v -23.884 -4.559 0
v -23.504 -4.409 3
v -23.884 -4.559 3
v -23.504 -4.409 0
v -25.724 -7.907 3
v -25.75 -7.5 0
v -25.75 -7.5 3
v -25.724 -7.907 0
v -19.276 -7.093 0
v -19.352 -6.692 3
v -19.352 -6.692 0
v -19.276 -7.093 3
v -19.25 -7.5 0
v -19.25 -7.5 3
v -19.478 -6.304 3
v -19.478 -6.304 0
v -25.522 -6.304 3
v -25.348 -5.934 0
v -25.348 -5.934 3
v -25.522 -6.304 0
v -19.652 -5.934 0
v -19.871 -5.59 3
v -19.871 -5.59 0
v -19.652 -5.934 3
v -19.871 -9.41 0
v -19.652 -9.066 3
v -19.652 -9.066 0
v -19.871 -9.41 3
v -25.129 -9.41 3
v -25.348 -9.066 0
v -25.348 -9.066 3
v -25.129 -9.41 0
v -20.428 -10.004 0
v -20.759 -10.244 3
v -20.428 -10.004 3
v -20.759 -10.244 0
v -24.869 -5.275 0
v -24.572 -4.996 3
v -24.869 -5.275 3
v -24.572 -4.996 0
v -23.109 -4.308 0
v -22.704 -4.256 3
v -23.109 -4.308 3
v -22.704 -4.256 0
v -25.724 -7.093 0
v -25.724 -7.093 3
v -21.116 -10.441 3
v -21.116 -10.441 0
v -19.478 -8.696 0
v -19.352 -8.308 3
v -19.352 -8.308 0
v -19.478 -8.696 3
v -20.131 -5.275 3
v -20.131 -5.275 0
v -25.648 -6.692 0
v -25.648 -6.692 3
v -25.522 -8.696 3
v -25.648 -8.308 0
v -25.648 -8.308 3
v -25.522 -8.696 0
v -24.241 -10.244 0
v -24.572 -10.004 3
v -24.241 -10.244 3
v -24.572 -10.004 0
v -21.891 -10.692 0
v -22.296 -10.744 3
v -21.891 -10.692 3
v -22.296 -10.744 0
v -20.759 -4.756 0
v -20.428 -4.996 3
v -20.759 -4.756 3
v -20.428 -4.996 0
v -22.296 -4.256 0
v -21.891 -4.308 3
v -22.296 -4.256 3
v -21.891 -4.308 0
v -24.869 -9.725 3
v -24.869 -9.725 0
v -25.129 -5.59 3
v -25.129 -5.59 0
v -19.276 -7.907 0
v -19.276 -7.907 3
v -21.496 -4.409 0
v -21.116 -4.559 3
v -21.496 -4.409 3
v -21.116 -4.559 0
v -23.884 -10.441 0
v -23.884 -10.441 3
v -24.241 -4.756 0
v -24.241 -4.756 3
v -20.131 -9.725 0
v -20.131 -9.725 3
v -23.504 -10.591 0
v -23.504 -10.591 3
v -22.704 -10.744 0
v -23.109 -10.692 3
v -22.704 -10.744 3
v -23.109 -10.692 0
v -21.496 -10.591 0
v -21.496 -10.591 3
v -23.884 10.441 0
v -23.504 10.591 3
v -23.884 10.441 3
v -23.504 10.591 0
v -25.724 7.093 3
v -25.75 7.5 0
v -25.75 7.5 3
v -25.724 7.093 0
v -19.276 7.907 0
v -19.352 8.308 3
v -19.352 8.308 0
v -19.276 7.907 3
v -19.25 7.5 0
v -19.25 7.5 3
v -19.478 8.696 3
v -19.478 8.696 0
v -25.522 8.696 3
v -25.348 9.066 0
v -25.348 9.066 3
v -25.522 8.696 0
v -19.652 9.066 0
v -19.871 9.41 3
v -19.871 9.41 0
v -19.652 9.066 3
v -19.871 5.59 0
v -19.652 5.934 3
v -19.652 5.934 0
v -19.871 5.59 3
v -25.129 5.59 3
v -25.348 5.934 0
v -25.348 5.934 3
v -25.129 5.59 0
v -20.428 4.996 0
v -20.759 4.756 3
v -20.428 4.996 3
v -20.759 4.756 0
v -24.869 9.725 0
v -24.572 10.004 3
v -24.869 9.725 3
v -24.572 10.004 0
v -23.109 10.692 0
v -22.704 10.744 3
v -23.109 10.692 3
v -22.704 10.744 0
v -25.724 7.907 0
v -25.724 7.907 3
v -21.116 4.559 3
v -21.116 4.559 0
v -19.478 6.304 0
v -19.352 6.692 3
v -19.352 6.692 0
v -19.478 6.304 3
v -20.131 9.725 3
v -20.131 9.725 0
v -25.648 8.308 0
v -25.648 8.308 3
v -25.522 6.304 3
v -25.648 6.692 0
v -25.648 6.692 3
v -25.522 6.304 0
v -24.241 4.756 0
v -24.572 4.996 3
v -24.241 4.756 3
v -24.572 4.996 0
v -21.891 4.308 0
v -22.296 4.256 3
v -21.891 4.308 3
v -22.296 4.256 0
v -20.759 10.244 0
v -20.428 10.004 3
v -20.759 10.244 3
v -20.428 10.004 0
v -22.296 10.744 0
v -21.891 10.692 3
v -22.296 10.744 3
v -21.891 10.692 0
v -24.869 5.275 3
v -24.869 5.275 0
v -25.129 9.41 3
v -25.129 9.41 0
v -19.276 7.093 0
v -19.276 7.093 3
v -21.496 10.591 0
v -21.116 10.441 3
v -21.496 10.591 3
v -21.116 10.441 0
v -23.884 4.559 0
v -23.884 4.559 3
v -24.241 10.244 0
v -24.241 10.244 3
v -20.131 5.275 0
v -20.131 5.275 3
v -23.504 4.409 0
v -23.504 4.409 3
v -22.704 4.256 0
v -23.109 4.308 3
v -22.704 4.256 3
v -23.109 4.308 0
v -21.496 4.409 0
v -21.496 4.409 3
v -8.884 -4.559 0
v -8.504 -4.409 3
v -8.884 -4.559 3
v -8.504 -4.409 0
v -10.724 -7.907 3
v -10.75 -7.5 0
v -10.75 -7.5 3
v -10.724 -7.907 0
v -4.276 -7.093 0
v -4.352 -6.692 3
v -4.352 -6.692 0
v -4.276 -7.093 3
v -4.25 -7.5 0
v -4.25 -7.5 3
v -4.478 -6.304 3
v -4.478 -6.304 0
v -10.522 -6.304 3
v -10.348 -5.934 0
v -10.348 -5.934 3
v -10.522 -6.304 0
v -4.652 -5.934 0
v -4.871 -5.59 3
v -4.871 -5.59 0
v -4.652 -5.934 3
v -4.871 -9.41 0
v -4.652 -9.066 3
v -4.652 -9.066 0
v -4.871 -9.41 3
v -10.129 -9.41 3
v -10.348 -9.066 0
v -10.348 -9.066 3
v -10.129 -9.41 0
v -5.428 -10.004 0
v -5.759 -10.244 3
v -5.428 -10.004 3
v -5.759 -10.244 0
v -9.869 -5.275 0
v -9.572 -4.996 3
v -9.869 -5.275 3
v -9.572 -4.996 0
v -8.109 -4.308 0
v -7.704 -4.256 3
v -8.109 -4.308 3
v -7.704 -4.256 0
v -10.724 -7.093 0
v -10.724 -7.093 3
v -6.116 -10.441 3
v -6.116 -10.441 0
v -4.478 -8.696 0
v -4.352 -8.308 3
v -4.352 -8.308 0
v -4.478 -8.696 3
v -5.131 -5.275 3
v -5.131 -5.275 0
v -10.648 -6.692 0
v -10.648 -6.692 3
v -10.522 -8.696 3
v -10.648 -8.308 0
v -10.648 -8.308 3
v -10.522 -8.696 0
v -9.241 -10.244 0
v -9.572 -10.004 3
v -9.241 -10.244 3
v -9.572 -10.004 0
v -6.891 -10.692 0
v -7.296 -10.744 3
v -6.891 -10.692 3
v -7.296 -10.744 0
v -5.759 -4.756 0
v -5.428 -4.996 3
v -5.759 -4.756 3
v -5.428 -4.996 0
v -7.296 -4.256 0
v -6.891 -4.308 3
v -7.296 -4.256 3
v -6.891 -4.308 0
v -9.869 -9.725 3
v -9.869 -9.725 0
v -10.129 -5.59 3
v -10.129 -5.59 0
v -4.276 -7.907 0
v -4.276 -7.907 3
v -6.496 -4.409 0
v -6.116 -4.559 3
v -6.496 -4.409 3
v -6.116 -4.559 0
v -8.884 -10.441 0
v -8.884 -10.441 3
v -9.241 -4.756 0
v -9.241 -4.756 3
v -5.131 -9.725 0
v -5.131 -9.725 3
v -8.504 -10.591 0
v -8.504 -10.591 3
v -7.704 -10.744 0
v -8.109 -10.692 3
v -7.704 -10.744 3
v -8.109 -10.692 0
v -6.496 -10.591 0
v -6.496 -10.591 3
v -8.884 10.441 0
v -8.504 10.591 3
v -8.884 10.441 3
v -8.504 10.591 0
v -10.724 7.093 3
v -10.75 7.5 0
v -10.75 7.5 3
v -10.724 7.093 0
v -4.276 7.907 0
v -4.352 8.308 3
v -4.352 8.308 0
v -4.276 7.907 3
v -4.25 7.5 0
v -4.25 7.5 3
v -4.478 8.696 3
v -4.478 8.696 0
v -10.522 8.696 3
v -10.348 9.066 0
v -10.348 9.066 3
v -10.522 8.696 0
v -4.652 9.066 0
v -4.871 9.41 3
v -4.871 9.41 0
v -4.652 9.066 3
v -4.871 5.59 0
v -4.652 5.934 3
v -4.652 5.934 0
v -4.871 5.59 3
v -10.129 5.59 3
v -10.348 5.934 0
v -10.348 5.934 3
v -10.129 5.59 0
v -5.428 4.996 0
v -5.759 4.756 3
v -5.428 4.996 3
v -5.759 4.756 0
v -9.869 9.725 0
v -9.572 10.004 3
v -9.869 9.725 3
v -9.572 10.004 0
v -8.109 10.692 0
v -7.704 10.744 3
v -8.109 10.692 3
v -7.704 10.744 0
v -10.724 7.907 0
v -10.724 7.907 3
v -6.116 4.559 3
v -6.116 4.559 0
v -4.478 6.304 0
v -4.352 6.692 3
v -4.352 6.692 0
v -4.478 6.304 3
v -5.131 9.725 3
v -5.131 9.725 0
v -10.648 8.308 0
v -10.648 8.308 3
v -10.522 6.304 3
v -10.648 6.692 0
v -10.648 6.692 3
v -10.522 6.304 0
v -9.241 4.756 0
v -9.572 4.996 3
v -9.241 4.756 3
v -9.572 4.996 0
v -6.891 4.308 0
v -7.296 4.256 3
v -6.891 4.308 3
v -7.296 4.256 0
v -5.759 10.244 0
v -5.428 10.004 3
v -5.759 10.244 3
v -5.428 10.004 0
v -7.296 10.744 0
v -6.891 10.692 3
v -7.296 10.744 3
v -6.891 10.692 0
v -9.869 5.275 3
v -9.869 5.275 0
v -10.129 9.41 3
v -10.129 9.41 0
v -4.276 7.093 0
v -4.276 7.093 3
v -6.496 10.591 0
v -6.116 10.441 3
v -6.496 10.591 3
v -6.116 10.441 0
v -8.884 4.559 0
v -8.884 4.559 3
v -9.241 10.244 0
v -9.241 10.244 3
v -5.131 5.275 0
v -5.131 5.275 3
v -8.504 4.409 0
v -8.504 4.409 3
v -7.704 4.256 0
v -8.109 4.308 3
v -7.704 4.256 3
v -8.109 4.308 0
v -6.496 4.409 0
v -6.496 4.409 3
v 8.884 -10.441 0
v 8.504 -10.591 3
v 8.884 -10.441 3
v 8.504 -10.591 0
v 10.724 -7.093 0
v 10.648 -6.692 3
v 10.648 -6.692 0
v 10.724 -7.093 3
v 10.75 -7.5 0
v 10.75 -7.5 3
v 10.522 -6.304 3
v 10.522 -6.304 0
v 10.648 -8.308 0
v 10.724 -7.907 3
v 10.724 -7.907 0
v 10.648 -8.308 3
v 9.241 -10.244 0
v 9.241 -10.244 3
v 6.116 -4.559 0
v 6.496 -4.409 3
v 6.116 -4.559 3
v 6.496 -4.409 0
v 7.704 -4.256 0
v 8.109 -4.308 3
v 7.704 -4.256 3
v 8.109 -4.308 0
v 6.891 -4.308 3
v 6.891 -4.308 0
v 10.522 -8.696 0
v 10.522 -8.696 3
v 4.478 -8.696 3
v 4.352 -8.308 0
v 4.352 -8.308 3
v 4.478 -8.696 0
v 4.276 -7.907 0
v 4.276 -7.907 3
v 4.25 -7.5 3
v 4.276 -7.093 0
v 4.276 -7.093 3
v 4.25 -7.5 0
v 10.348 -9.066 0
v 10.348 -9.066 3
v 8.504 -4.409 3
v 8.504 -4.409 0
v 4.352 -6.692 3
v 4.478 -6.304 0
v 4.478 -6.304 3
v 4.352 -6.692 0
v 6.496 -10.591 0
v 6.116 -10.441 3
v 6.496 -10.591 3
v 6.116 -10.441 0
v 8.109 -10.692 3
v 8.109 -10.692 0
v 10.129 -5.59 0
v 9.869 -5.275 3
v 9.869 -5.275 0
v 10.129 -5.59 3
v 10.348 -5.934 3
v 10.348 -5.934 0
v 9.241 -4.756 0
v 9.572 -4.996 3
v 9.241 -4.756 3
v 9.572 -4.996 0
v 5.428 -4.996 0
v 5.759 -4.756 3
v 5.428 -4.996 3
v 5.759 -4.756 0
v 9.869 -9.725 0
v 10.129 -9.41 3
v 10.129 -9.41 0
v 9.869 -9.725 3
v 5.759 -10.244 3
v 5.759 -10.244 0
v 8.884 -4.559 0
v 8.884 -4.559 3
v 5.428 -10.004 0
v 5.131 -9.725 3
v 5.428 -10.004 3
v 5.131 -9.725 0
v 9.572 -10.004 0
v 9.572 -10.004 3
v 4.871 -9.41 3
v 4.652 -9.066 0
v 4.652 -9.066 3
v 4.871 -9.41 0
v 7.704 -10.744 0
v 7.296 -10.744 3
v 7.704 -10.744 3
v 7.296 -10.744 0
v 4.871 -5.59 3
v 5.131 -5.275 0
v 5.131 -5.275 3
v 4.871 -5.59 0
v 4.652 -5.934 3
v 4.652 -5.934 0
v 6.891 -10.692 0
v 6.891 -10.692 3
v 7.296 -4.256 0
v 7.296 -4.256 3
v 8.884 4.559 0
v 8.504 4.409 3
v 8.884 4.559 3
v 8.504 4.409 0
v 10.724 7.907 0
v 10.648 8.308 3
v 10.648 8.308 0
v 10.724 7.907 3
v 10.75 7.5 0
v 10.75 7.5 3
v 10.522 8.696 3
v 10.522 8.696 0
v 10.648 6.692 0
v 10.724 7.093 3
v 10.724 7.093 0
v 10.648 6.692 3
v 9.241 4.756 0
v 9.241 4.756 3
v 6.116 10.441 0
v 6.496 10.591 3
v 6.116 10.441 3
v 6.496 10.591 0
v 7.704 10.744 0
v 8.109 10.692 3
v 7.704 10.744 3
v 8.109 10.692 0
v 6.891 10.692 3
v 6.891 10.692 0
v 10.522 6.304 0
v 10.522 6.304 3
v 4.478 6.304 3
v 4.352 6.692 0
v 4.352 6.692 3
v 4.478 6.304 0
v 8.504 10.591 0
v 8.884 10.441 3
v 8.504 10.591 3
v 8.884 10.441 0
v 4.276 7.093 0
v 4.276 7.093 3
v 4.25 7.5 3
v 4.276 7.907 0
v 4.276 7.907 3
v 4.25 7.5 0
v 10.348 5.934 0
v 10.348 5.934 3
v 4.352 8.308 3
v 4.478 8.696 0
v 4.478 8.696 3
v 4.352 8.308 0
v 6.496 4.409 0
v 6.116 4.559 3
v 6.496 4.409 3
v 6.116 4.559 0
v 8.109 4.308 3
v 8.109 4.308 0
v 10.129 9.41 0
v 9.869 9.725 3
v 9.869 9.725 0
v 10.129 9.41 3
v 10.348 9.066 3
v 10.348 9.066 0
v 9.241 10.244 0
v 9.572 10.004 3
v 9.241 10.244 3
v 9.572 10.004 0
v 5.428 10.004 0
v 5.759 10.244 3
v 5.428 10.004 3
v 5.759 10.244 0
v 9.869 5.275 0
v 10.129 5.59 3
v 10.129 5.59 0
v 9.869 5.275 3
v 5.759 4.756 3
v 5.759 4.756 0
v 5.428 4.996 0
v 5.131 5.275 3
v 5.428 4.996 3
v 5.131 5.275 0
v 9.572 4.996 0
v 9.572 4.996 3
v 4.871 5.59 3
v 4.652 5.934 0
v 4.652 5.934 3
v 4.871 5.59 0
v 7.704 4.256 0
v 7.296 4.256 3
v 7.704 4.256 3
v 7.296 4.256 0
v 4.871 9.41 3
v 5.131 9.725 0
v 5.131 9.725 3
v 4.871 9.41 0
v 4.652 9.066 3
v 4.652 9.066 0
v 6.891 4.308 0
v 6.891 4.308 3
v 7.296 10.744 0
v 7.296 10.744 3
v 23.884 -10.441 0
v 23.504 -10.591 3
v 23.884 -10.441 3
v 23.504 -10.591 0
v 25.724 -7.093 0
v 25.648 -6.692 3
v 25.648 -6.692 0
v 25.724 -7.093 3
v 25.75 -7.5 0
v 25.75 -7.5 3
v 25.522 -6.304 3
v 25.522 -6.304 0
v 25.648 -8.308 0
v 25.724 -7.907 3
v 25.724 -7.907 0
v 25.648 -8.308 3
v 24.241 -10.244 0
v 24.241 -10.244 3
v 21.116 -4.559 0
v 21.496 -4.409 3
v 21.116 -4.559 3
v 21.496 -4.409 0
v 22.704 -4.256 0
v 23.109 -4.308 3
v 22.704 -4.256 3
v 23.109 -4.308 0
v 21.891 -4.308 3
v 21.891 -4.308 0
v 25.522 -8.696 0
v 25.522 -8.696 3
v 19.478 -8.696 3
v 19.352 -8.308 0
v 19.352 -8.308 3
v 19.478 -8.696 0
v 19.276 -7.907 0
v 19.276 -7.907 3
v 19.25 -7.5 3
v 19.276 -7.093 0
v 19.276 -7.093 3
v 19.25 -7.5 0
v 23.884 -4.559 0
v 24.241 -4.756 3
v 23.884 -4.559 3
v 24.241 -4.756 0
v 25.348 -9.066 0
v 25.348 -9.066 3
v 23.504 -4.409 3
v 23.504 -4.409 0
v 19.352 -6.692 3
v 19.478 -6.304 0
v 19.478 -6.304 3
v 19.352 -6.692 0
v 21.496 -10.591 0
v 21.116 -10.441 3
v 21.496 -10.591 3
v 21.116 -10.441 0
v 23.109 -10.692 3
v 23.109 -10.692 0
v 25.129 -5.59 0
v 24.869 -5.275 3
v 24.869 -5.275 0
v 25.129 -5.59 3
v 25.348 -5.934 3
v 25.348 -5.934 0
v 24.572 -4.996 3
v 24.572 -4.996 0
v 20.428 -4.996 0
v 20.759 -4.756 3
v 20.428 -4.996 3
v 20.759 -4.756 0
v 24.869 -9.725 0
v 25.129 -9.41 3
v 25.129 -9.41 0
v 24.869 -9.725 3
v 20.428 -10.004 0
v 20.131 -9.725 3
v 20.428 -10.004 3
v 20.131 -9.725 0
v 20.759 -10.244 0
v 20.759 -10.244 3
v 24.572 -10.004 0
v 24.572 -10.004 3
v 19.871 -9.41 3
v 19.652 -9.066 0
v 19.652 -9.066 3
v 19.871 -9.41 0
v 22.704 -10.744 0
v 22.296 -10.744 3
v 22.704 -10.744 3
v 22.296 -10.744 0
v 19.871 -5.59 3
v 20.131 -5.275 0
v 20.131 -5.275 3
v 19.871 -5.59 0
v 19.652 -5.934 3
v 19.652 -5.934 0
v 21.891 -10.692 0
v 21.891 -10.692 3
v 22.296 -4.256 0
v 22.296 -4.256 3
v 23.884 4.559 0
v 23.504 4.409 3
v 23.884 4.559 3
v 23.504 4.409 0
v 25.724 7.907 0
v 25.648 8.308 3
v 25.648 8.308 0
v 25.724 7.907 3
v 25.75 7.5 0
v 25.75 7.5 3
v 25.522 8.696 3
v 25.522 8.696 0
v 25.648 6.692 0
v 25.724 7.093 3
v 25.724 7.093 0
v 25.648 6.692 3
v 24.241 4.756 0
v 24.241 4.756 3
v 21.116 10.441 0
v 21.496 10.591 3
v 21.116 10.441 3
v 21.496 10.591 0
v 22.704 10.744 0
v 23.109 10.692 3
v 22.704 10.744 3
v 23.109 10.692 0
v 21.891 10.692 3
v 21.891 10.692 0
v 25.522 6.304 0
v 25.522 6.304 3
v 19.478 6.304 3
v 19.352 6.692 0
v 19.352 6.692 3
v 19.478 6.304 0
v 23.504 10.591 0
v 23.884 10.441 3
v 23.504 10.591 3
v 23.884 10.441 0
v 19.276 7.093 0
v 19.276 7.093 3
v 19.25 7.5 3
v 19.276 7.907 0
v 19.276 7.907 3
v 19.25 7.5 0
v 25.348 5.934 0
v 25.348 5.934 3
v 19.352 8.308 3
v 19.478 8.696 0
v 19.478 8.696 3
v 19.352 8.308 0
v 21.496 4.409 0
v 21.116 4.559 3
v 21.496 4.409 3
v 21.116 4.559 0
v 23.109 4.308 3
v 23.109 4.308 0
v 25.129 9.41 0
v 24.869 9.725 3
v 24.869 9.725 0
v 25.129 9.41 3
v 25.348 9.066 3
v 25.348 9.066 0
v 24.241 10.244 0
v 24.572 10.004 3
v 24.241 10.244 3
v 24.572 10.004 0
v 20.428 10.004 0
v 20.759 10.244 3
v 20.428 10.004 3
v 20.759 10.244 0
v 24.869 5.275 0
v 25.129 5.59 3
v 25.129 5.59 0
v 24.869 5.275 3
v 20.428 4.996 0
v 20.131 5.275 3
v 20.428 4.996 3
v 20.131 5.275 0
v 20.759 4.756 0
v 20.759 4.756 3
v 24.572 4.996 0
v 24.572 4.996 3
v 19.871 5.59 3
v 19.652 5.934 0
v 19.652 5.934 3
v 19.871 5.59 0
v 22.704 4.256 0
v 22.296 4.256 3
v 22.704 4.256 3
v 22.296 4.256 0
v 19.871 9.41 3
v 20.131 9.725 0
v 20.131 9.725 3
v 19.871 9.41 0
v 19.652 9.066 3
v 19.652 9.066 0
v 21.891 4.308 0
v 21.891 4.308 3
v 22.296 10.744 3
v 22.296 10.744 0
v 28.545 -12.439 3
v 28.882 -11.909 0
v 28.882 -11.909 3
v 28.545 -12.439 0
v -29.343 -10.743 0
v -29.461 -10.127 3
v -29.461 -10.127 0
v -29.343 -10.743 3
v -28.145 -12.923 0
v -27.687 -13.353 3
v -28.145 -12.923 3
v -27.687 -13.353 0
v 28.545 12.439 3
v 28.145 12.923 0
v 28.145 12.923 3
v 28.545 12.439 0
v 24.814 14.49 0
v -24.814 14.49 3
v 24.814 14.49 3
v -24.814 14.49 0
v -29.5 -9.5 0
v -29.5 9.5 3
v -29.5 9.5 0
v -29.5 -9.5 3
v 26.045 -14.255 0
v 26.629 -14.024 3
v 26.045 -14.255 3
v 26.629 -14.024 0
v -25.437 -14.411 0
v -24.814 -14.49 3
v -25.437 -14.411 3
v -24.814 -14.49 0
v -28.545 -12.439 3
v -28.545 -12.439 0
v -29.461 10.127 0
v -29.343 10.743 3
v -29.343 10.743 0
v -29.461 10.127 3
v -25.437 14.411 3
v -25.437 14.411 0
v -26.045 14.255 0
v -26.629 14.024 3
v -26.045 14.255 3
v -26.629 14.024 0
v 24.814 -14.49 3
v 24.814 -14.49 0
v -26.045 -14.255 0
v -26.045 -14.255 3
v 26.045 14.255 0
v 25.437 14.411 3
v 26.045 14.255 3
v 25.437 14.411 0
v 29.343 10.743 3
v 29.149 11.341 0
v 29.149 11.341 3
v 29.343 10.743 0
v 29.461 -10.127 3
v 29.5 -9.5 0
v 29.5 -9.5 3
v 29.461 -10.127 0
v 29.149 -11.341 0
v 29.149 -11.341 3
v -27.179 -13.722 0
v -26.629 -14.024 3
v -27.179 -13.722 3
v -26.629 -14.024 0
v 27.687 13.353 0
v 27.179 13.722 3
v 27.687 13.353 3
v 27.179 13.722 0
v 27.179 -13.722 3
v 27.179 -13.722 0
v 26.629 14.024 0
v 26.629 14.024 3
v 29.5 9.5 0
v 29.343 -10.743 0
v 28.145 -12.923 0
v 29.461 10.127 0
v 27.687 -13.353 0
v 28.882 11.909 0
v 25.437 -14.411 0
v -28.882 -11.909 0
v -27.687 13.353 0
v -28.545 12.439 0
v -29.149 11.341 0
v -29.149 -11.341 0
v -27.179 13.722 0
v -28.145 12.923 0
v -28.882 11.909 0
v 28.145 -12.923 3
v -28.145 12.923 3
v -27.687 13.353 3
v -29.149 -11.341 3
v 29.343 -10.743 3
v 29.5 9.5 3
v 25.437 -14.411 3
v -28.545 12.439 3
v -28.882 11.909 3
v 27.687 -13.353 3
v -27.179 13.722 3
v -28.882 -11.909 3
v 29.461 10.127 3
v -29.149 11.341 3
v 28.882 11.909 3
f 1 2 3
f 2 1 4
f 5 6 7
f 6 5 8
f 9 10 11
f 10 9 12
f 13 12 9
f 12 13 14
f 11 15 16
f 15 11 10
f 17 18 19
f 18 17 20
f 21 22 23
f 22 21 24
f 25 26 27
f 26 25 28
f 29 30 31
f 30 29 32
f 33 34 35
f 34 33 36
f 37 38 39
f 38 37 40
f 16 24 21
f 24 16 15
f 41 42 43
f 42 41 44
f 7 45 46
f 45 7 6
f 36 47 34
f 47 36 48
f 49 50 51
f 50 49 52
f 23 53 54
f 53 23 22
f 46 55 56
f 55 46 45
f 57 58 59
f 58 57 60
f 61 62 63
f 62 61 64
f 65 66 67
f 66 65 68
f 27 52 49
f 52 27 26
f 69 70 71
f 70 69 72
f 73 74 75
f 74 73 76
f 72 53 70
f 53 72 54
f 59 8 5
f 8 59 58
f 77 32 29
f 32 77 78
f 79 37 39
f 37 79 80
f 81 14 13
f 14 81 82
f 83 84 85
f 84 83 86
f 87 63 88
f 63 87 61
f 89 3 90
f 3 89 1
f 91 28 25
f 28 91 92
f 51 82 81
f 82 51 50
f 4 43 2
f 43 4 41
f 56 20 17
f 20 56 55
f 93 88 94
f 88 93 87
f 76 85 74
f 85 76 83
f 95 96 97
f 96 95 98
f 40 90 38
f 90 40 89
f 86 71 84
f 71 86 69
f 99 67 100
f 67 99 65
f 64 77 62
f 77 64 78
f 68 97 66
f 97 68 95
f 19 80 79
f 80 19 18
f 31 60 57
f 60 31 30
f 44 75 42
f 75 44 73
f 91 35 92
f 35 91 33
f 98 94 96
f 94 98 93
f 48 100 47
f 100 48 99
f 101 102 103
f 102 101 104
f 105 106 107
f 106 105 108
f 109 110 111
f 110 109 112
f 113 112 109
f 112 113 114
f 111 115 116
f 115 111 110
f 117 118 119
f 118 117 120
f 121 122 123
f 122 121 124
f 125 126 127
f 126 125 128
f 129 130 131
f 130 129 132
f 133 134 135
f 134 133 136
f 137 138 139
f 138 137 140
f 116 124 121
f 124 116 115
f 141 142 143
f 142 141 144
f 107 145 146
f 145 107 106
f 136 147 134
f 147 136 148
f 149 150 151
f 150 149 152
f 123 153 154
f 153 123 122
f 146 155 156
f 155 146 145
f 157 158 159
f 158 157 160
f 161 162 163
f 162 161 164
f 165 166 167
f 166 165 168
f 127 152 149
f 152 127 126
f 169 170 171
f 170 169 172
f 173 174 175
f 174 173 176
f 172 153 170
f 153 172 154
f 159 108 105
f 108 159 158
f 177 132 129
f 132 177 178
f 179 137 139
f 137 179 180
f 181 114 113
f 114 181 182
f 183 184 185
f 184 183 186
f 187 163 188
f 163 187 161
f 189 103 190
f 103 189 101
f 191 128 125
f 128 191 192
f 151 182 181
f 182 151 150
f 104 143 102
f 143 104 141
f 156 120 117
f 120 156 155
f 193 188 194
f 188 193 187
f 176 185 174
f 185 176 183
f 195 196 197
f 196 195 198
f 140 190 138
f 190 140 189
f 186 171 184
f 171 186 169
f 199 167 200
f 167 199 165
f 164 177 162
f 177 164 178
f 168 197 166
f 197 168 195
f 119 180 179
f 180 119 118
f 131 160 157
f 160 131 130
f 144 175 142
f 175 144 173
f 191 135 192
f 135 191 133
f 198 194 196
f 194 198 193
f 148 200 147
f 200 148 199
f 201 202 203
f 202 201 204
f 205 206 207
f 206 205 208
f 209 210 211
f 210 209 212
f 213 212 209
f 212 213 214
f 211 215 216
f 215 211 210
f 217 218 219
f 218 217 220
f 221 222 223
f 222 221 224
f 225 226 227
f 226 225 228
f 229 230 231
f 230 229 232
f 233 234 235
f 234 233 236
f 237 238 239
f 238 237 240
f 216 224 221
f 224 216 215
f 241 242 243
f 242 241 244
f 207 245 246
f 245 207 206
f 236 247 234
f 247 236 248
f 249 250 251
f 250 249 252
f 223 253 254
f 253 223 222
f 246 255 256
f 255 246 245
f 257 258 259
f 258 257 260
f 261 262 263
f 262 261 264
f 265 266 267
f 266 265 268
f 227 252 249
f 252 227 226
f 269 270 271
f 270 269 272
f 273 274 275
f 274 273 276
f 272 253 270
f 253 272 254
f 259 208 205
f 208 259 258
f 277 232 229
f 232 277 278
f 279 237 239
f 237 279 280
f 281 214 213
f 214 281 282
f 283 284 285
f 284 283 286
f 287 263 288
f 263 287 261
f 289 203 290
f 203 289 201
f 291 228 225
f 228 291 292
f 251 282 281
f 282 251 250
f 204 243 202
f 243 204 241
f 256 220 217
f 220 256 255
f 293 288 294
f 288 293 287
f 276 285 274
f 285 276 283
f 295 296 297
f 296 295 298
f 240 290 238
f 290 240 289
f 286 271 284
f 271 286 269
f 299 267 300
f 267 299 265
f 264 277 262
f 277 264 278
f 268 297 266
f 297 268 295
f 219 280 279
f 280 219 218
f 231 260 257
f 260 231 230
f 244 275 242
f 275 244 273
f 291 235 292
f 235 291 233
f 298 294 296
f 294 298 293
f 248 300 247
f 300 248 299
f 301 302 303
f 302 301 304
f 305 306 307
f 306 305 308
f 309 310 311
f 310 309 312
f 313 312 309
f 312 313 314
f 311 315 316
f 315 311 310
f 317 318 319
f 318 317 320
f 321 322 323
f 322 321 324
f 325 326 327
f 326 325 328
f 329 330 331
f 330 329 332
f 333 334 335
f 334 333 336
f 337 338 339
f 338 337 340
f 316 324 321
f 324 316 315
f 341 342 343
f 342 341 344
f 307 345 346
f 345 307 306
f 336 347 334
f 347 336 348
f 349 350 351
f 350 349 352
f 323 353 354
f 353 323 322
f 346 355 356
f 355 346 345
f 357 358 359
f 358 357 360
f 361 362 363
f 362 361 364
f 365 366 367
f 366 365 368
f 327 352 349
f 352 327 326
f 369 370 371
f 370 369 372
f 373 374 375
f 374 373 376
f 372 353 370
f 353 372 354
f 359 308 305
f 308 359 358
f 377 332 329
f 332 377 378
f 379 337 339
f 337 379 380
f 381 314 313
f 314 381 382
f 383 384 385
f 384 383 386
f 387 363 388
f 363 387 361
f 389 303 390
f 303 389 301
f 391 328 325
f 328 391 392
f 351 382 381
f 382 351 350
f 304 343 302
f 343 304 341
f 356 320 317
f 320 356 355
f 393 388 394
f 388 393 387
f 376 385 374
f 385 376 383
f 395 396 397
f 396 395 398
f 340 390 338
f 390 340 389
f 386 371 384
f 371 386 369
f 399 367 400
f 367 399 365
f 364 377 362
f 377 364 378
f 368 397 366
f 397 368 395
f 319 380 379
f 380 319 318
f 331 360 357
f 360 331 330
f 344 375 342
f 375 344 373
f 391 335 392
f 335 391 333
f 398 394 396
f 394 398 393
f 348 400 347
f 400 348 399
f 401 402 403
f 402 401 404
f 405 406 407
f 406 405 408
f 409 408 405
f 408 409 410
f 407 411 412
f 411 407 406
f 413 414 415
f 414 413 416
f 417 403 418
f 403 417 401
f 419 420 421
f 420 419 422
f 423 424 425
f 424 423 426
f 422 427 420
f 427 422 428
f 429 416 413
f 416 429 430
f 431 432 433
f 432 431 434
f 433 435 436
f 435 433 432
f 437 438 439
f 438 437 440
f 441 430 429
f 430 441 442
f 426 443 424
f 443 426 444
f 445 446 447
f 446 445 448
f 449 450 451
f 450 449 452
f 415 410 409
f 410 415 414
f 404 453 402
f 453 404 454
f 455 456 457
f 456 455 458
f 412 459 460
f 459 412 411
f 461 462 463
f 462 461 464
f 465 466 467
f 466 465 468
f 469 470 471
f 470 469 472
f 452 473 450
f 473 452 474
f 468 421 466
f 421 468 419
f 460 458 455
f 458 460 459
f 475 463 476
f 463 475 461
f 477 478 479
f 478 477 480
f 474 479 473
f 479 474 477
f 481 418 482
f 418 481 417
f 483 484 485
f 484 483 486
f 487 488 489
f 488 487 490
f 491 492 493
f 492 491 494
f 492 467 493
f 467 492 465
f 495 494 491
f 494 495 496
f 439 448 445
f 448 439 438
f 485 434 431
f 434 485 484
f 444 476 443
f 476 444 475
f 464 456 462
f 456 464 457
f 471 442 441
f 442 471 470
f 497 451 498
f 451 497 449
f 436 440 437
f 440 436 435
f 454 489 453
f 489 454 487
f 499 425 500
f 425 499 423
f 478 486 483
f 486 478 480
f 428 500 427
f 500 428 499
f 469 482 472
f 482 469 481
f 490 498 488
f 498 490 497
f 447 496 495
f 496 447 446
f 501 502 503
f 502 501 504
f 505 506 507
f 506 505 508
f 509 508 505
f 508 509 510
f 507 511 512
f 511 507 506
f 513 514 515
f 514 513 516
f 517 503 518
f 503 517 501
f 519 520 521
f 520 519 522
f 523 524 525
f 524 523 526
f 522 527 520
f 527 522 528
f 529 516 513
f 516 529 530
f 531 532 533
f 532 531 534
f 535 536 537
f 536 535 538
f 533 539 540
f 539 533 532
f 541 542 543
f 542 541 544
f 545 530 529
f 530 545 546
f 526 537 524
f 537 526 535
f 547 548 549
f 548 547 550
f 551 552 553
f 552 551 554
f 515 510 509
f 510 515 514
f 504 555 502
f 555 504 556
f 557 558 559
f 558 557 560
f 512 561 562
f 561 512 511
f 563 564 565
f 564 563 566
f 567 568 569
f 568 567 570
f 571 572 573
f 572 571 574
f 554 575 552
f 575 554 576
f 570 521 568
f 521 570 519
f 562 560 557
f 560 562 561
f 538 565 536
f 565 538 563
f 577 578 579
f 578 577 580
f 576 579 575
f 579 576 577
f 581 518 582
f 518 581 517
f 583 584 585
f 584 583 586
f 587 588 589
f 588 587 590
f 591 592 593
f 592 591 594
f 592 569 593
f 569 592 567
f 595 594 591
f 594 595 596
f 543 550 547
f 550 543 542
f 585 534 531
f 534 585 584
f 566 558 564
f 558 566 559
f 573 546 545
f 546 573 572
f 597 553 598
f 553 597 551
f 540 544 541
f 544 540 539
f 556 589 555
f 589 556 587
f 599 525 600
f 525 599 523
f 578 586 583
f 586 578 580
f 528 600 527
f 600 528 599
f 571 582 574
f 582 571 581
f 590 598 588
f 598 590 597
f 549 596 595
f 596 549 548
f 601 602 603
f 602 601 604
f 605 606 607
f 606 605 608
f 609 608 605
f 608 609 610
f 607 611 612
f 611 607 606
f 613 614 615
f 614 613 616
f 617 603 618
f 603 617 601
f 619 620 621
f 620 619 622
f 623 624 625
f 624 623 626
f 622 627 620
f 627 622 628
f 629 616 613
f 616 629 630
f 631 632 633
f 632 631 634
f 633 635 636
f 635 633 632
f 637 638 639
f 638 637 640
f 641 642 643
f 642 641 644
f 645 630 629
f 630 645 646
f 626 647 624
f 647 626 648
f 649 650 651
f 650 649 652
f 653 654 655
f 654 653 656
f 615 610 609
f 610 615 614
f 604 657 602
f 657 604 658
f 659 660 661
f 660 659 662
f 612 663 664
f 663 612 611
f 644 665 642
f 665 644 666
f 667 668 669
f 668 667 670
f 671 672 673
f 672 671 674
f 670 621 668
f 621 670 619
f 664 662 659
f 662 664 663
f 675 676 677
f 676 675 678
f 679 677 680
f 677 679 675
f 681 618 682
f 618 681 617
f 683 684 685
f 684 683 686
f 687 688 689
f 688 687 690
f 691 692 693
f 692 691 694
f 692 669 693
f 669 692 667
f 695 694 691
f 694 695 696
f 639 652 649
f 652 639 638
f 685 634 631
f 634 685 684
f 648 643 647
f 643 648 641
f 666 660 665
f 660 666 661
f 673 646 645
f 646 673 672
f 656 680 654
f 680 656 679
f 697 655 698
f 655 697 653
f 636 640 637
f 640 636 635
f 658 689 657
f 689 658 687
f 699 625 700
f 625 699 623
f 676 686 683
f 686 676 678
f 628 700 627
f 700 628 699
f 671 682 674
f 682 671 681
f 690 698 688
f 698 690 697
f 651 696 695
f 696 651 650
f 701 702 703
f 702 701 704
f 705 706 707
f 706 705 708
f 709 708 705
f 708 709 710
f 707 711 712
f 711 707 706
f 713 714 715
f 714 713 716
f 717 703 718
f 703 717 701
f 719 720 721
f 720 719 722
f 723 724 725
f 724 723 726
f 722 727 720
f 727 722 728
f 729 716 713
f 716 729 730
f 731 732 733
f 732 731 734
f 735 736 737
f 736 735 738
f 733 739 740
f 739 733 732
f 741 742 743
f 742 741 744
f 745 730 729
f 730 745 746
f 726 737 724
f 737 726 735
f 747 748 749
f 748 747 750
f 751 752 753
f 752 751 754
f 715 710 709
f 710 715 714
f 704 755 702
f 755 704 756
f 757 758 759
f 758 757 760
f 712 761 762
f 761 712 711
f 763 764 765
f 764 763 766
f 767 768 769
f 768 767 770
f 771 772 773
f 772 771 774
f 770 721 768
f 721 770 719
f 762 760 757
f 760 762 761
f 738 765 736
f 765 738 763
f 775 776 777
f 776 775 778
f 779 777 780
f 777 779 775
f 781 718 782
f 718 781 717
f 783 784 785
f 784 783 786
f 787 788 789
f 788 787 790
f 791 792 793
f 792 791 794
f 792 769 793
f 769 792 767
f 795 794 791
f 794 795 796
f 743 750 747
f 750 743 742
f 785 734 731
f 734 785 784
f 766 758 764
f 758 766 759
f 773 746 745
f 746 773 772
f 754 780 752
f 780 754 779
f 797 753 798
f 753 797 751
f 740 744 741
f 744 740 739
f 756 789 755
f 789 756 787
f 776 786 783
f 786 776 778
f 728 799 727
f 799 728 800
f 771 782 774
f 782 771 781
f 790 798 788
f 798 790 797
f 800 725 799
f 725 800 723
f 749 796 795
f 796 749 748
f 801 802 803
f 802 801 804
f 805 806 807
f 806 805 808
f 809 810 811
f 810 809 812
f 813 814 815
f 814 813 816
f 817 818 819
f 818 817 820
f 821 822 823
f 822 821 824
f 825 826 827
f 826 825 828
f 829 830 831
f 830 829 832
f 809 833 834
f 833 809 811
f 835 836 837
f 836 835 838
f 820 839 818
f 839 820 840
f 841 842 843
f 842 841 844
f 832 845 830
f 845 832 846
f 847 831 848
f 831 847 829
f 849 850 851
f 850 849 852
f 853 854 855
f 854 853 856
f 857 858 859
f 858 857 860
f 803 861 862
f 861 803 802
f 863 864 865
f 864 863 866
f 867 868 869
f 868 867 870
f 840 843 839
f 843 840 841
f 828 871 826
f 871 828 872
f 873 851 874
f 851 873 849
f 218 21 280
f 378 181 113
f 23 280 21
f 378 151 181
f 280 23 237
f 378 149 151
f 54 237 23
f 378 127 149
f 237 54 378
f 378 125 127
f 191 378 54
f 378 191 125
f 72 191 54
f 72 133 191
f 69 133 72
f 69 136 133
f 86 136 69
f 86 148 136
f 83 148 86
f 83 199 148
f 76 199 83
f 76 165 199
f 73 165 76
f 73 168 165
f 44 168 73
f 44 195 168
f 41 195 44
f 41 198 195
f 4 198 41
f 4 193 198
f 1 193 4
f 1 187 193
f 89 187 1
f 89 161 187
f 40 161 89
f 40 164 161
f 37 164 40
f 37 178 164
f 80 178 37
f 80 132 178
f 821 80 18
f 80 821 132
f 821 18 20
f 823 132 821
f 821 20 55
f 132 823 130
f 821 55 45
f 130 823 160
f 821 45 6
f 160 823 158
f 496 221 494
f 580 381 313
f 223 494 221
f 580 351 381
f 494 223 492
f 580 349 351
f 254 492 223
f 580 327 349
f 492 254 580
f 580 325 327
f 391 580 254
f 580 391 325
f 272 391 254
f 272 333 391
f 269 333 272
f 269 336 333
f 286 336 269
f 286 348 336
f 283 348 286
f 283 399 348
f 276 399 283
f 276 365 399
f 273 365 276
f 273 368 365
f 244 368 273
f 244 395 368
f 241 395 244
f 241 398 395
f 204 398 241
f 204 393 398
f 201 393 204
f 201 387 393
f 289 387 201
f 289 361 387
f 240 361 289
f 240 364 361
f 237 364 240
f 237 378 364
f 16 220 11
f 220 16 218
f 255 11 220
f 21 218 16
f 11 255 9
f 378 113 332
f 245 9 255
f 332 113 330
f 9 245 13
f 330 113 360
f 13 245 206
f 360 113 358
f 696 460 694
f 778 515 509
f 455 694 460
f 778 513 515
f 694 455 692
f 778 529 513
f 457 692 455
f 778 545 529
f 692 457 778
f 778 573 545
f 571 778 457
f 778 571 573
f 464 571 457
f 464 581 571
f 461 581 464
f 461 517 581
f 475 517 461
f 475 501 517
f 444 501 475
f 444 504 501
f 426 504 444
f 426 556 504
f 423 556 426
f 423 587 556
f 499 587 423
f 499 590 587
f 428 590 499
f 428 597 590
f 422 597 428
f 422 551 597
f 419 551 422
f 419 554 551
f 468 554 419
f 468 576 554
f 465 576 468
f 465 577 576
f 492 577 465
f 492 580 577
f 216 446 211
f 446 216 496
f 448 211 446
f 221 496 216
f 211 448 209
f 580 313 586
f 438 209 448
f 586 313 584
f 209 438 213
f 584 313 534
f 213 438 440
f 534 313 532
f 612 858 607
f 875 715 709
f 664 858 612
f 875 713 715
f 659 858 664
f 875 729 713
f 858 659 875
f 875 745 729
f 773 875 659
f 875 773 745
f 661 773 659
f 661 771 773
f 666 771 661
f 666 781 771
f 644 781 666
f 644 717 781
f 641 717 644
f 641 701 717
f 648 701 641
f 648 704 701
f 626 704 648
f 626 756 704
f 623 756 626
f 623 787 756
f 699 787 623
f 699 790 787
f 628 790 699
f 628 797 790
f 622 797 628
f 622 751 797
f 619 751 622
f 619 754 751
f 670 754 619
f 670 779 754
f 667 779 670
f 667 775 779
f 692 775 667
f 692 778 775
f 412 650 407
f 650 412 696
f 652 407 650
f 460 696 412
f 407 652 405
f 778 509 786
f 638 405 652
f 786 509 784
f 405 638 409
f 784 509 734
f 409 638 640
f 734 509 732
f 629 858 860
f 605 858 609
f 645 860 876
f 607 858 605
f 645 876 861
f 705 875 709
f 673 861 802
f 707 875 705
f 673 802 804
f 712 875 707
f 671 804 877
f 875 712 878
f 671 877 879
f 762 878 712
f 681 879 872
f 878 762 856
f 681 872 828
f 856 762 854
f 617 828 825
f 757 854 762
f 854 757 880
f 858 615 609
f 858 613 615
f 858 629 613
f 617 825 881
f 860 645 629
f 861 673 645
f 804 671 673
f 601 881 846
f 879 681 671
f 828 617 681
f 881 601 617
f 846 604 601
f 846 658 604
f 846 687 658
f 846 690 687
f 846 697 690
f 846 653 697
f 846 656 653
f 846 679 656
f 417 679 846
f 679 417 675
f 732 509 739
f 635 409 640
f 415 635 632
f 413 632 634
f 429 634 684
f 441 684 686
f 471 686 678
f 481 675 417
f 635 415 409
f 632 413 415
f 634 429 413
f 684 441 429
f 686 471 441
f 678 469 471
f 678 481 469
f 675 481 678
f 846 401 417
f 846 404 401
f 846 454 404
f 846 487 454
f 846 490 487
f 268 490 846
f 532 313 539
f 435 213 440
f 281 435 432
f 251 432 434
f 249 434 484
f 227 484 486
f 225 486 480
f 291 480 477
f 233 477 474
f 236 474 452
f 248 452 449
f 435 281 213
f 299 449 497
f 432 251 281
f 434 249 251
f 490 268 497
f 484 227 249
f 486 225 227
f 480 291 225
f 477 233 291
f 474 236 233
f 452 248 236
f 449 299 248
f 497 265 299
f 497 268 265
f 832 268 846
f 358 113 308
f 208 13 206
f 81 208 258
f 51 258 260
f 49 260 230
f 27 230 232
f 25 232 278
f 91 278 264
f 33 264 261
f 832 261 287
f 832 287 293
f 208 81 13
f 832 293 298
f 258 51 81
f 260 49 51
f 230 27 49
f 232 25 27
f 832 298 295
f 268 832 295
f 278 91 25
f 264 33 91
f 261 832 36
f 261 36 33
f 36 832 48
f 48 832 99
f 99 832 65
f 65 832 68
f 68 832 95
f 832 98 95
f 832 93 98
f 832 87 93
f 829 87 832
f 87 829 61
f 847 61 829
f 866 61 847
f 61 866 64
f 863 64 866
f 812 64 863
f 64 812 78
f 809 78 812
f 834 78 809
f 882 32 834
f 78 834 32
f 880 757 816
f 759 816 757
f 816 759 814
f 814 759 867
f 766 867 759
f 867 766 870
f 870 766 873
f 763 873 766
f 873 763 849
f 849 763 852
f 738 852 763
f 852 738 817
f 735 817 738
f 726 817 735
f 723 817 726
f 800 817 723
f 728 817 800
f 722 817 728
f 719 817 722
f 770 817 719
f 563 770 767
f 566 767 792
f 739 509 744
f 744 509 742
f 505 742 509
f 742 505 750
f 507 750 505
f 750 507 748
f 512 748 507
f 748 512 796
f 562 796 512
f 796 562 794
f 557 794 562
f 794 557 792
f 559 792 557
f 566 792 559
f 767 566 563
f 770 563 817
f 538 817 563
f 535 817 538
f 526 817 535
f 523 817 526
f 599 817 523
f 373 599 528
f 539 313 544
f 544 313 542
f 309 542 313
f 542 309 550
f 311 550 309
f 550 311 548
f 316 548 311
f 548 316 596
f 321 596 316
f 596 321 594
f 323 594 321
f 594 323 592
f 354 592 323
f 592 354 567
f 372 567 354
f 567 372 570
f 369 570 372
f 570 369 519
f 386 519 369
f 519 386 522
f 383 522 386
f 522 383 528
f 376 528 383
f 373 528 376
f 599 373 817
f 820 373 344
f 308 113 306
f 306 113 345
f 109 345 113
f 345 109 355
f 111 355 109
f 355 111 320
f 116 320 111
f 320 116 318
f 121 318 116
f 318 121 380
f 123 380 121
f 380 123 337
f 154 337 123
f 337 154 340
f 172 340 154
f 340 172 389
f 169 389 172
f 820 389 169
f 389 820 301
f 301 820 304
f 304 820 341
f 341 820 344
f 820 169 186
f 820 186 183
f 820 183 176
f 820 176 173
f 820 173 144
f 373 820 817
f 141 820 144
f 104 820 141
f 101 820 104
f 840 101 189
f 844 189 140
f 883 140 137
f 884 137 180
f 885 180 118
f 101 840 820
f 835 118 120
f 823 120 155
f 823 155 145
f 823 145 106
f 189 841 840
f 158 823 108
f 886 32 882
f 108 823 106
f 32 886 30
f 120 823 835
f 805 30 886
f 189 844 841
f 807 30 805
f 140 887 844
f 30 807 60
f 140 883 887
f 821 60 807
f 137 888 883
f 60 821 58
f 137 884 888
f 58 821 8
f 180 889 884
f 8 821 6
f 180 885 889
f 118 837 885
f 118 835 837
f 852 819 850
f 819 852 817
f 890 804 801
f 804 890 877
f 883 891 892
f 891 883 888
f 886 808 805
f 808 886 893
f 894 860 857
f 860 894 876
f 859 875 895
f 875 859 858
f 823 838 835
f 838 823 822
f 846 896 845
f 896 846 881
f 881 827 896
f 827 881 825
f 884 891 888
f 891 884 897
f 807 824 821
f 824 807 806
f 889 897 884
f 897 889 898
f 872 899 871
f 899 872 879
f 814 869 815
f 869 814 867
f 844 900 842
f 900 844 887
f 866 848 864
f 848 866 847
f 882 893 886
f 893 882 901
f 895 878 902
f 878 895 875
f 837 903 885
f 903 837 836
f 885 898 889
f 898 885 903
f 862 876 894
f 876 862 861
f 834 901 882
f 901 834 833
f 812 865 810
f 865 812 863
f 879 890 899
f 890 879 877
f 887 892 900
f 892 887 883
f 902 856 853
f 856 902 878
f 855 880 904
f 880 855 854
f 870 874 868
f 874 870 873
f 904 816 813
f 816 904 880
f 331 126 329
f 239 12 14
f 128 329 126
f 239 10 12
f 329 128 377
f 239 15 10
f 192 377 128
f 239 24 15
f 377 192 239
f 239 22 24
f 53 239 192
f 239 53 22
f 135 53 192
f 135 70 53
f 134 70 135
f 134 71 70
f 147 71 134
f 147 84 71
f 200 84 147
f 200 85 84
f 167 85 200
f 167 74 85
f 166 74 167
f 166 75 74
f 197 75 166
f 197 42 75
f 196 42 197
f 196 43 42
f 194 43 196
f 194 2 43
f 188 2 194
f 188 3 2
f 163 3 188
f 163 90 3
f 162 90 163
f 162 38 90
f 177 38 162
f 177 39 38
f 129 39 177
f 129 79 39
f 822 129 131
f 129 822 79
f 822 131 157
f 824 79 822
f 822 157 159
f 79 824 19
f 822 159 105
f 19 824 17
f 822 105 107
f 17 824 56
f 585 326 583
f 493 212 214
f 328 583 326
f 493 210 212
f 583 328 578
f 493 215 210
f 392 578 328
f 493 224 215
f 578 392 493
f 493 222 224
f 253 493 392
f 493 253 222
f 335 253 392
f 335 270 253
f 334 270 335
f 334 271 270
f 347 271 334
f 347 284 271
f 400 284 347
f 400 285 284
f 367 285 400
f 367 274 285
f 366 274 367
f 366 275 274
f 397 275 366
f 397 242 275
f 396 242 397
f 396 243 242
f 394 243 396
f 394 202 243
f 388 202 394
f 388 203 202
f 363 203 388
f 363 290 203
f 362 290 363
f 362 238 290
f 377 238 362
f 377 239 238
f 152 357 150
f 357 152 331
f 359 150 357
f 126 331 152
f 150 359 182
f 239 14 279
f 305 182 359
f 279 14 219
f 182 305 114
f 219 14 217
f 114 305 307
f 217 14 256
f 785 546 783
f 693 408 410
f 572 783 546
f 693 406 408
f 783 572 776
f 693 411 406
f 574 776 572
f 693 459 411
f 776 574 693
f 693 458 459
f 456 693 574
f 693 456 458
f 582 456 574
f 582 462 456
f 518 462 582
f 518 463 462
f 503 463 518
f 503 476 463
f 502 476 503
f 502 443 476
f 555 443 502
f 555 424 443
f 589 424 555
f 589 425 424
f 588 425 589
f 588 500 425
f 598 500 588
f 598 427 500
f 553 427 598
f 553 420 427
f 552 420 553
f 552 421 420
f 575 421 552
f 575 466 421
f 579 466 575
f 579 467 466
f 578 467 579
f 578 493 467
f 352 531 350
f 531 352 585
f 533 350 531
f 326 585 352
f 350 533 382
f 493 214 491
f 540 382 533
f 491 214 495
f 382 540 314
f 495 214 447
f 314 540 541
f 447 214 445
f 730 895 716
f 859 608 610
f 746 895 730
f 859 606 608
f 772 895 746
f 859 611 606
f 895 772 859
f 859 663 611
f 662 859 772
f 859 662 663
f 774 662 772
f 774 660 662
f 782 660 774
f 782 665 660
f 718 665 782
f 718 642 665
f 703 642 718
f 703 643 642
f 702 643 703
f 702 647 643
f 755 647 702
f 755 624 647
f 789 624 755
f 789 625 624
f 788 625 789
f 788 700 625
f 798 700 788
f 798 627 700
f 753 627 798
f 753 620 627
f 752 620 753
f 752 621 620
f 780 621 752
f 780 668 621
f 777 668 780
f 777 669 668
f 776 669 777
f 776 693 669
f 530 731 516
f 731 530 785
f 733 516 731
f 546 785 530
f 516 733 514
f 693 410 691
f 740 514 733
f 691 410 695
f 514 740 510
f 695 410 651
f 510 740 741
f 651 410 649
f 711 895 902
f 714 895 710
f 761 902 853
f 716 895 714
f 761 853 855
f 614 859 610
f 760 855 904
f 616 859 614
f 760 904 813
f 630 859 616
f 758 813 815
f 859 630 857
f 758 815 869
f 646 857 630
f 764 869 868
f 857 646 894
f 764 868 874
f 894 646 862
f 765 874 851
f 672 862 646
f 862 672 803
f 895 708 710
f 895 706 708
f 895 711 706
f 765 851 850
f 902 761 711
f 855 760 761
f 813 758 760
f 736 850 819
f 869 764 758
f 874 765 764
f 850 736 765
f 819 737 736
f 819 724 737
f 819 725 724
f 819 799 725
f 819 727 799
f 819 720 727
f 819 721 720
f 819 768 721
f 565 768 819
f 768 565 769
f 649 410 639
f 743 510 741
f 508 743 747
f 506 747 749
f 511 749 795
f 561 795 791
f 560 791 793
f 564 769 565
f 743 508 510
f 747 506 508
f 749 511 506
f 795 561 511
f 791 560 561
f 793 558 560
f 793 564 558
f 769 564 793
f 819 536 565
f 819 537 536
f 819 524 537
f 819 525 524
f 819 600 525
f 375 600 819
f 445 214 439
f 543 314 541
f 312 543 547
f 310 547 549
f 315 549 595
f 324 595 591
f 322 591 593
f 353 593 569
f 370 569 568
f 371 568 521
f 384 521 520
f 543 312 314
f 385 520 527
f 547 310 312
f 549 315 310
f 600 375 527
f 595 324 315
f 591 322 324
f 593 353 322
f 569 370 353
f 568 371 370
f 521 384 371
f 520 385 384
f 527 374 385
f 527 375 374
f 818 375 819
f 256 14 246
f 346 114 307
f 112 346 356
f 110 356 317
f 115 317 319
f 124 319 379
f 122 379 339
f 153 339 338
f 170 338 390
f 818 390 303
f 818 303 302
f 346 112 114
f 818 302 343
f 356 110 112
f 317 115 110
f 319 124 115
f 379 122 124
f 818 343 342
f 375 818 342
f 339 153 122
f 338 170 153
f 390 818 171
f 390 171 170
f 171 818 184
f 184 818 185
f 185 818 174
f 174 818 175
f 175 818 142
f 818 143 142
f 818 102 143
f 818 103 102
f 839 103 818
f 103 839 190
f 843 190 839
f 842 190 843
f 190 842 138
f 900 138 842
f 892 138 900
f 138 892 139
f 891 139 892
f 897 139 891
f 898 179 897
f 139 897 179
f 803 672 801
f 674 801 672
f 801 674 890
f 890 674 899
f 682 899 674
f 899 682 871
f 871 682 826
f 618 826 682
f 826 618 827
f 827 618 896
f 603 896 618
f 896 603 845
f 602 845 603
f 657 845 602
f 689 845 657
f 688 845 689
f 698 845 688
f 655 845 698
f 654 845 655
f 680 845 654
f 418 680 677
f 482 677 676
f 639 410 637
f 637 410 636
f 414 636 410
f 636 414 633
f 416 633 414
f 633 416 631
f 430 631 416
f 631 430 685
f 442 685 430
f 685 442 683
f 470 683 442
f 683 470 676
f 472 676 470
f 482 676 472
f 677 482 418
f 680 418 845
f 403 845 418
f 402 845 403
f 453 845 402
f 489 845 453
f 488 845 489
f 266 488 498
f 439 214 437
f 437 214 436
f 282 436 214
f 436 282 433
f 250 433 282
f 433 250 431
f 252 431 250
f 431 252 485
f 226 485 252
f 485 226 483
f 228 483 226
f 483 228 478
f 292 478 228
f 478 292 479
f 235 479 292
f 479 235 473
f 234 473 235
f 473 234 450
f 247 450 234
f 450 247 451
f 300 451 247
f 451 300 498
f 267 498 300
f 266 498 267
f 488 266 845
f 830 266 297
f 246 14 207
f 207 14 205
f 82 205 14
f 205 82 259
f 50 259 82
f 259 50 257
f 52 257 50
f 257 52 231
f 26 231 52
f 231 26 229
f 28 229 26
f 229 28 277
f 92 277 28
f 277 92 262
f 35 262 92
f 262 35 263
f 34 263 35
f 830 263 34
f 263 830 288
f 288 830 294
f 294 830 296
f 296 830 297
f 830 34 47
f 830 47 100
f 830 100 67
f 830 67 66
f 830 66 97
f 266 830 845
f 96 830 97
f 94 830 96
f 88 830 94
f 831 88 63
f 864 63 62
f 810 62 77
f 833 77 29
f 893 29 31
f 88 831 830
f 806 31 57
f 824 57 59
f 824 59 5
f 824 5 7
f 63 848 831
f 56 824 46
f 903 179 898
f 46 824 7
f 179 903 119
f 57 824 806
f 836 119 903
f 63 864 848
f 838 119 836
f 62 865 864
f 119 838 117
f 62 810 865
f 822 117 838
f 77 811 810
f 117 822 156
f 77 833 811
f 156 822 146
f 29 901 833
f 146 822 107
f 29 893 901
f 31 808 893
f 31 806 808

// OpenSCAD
$fn = 50;


difference() {
	union() {
		hull() {
			translate(v = [-24.5000000000, 9.5000000000, 0]) {
				cylinder(h = 3, r = 5);
			}
			translate(v = [24.5000000000, 9.5000000000, 0]) {
				cylinder(h = 3, r = 5);
			}
			translate(v = [-24.5000000000, -9.5000000000, 0]) {
				cylinder(h = 3, r = 5);
			}
			translate(v = [24.5000000000, -9.5000000000, 0]) {
				cylinder(h = 3, r = 5);
			}
		}
	}
	union() {
		translate(v = [-22.5000000000, -7.5000000000, 0]) {
			translate(v = [0, 0, -100]) {
				cylinder(h = 200, r = 3.2500000000);
			}
		}
		translate(v = [-22.5000000000, 7.5000000000, 0]) {
			translate(v = [0, 0, -100]) {
				cylinder(h = 200, r = 3.2500000000);
			}
		}
		translate(v = [-7.5000000000, -7.5000000000, 0]) {
			translate(v = [0, 0, -100]) {
				cylinder(h = 200, r = 3.2500000000);
			}
		}
		translate(v = [-7.5000000000, 7.5000000000, 0]) {
			translate(v = [0, 0, -100]) {
				cylinder(h = 200, r = 3.2500000000);
			}
		}
		translate(v = [7.5000000000, -7.5000000000, 0]) {
			translate(v = [0, 0, -100]) {
				cylinder(h = 200, r = 3.2500000000);
			}
		}
		translate(v = [7.5000000000, 7.5000000000, 0]) {
			translate(v = [0, 0, -100]) {
				cylinder(h = 200, r = 3.2500000000);
			}
		}
		translate(v = [22.5000000000, -7.5000000000, 0]) {
			translate(v = [0, 0, -100]) {
				cylinder(h = 200, r = 3.2500000000);
			}
		}
		translate(v = [22.5000000000, 7.5000000000, 0]) {
			translate(v = [0, 0, -100]) {
				cylinder(h = 200, r = 3.2500000000);
			}
		}
	}
}
